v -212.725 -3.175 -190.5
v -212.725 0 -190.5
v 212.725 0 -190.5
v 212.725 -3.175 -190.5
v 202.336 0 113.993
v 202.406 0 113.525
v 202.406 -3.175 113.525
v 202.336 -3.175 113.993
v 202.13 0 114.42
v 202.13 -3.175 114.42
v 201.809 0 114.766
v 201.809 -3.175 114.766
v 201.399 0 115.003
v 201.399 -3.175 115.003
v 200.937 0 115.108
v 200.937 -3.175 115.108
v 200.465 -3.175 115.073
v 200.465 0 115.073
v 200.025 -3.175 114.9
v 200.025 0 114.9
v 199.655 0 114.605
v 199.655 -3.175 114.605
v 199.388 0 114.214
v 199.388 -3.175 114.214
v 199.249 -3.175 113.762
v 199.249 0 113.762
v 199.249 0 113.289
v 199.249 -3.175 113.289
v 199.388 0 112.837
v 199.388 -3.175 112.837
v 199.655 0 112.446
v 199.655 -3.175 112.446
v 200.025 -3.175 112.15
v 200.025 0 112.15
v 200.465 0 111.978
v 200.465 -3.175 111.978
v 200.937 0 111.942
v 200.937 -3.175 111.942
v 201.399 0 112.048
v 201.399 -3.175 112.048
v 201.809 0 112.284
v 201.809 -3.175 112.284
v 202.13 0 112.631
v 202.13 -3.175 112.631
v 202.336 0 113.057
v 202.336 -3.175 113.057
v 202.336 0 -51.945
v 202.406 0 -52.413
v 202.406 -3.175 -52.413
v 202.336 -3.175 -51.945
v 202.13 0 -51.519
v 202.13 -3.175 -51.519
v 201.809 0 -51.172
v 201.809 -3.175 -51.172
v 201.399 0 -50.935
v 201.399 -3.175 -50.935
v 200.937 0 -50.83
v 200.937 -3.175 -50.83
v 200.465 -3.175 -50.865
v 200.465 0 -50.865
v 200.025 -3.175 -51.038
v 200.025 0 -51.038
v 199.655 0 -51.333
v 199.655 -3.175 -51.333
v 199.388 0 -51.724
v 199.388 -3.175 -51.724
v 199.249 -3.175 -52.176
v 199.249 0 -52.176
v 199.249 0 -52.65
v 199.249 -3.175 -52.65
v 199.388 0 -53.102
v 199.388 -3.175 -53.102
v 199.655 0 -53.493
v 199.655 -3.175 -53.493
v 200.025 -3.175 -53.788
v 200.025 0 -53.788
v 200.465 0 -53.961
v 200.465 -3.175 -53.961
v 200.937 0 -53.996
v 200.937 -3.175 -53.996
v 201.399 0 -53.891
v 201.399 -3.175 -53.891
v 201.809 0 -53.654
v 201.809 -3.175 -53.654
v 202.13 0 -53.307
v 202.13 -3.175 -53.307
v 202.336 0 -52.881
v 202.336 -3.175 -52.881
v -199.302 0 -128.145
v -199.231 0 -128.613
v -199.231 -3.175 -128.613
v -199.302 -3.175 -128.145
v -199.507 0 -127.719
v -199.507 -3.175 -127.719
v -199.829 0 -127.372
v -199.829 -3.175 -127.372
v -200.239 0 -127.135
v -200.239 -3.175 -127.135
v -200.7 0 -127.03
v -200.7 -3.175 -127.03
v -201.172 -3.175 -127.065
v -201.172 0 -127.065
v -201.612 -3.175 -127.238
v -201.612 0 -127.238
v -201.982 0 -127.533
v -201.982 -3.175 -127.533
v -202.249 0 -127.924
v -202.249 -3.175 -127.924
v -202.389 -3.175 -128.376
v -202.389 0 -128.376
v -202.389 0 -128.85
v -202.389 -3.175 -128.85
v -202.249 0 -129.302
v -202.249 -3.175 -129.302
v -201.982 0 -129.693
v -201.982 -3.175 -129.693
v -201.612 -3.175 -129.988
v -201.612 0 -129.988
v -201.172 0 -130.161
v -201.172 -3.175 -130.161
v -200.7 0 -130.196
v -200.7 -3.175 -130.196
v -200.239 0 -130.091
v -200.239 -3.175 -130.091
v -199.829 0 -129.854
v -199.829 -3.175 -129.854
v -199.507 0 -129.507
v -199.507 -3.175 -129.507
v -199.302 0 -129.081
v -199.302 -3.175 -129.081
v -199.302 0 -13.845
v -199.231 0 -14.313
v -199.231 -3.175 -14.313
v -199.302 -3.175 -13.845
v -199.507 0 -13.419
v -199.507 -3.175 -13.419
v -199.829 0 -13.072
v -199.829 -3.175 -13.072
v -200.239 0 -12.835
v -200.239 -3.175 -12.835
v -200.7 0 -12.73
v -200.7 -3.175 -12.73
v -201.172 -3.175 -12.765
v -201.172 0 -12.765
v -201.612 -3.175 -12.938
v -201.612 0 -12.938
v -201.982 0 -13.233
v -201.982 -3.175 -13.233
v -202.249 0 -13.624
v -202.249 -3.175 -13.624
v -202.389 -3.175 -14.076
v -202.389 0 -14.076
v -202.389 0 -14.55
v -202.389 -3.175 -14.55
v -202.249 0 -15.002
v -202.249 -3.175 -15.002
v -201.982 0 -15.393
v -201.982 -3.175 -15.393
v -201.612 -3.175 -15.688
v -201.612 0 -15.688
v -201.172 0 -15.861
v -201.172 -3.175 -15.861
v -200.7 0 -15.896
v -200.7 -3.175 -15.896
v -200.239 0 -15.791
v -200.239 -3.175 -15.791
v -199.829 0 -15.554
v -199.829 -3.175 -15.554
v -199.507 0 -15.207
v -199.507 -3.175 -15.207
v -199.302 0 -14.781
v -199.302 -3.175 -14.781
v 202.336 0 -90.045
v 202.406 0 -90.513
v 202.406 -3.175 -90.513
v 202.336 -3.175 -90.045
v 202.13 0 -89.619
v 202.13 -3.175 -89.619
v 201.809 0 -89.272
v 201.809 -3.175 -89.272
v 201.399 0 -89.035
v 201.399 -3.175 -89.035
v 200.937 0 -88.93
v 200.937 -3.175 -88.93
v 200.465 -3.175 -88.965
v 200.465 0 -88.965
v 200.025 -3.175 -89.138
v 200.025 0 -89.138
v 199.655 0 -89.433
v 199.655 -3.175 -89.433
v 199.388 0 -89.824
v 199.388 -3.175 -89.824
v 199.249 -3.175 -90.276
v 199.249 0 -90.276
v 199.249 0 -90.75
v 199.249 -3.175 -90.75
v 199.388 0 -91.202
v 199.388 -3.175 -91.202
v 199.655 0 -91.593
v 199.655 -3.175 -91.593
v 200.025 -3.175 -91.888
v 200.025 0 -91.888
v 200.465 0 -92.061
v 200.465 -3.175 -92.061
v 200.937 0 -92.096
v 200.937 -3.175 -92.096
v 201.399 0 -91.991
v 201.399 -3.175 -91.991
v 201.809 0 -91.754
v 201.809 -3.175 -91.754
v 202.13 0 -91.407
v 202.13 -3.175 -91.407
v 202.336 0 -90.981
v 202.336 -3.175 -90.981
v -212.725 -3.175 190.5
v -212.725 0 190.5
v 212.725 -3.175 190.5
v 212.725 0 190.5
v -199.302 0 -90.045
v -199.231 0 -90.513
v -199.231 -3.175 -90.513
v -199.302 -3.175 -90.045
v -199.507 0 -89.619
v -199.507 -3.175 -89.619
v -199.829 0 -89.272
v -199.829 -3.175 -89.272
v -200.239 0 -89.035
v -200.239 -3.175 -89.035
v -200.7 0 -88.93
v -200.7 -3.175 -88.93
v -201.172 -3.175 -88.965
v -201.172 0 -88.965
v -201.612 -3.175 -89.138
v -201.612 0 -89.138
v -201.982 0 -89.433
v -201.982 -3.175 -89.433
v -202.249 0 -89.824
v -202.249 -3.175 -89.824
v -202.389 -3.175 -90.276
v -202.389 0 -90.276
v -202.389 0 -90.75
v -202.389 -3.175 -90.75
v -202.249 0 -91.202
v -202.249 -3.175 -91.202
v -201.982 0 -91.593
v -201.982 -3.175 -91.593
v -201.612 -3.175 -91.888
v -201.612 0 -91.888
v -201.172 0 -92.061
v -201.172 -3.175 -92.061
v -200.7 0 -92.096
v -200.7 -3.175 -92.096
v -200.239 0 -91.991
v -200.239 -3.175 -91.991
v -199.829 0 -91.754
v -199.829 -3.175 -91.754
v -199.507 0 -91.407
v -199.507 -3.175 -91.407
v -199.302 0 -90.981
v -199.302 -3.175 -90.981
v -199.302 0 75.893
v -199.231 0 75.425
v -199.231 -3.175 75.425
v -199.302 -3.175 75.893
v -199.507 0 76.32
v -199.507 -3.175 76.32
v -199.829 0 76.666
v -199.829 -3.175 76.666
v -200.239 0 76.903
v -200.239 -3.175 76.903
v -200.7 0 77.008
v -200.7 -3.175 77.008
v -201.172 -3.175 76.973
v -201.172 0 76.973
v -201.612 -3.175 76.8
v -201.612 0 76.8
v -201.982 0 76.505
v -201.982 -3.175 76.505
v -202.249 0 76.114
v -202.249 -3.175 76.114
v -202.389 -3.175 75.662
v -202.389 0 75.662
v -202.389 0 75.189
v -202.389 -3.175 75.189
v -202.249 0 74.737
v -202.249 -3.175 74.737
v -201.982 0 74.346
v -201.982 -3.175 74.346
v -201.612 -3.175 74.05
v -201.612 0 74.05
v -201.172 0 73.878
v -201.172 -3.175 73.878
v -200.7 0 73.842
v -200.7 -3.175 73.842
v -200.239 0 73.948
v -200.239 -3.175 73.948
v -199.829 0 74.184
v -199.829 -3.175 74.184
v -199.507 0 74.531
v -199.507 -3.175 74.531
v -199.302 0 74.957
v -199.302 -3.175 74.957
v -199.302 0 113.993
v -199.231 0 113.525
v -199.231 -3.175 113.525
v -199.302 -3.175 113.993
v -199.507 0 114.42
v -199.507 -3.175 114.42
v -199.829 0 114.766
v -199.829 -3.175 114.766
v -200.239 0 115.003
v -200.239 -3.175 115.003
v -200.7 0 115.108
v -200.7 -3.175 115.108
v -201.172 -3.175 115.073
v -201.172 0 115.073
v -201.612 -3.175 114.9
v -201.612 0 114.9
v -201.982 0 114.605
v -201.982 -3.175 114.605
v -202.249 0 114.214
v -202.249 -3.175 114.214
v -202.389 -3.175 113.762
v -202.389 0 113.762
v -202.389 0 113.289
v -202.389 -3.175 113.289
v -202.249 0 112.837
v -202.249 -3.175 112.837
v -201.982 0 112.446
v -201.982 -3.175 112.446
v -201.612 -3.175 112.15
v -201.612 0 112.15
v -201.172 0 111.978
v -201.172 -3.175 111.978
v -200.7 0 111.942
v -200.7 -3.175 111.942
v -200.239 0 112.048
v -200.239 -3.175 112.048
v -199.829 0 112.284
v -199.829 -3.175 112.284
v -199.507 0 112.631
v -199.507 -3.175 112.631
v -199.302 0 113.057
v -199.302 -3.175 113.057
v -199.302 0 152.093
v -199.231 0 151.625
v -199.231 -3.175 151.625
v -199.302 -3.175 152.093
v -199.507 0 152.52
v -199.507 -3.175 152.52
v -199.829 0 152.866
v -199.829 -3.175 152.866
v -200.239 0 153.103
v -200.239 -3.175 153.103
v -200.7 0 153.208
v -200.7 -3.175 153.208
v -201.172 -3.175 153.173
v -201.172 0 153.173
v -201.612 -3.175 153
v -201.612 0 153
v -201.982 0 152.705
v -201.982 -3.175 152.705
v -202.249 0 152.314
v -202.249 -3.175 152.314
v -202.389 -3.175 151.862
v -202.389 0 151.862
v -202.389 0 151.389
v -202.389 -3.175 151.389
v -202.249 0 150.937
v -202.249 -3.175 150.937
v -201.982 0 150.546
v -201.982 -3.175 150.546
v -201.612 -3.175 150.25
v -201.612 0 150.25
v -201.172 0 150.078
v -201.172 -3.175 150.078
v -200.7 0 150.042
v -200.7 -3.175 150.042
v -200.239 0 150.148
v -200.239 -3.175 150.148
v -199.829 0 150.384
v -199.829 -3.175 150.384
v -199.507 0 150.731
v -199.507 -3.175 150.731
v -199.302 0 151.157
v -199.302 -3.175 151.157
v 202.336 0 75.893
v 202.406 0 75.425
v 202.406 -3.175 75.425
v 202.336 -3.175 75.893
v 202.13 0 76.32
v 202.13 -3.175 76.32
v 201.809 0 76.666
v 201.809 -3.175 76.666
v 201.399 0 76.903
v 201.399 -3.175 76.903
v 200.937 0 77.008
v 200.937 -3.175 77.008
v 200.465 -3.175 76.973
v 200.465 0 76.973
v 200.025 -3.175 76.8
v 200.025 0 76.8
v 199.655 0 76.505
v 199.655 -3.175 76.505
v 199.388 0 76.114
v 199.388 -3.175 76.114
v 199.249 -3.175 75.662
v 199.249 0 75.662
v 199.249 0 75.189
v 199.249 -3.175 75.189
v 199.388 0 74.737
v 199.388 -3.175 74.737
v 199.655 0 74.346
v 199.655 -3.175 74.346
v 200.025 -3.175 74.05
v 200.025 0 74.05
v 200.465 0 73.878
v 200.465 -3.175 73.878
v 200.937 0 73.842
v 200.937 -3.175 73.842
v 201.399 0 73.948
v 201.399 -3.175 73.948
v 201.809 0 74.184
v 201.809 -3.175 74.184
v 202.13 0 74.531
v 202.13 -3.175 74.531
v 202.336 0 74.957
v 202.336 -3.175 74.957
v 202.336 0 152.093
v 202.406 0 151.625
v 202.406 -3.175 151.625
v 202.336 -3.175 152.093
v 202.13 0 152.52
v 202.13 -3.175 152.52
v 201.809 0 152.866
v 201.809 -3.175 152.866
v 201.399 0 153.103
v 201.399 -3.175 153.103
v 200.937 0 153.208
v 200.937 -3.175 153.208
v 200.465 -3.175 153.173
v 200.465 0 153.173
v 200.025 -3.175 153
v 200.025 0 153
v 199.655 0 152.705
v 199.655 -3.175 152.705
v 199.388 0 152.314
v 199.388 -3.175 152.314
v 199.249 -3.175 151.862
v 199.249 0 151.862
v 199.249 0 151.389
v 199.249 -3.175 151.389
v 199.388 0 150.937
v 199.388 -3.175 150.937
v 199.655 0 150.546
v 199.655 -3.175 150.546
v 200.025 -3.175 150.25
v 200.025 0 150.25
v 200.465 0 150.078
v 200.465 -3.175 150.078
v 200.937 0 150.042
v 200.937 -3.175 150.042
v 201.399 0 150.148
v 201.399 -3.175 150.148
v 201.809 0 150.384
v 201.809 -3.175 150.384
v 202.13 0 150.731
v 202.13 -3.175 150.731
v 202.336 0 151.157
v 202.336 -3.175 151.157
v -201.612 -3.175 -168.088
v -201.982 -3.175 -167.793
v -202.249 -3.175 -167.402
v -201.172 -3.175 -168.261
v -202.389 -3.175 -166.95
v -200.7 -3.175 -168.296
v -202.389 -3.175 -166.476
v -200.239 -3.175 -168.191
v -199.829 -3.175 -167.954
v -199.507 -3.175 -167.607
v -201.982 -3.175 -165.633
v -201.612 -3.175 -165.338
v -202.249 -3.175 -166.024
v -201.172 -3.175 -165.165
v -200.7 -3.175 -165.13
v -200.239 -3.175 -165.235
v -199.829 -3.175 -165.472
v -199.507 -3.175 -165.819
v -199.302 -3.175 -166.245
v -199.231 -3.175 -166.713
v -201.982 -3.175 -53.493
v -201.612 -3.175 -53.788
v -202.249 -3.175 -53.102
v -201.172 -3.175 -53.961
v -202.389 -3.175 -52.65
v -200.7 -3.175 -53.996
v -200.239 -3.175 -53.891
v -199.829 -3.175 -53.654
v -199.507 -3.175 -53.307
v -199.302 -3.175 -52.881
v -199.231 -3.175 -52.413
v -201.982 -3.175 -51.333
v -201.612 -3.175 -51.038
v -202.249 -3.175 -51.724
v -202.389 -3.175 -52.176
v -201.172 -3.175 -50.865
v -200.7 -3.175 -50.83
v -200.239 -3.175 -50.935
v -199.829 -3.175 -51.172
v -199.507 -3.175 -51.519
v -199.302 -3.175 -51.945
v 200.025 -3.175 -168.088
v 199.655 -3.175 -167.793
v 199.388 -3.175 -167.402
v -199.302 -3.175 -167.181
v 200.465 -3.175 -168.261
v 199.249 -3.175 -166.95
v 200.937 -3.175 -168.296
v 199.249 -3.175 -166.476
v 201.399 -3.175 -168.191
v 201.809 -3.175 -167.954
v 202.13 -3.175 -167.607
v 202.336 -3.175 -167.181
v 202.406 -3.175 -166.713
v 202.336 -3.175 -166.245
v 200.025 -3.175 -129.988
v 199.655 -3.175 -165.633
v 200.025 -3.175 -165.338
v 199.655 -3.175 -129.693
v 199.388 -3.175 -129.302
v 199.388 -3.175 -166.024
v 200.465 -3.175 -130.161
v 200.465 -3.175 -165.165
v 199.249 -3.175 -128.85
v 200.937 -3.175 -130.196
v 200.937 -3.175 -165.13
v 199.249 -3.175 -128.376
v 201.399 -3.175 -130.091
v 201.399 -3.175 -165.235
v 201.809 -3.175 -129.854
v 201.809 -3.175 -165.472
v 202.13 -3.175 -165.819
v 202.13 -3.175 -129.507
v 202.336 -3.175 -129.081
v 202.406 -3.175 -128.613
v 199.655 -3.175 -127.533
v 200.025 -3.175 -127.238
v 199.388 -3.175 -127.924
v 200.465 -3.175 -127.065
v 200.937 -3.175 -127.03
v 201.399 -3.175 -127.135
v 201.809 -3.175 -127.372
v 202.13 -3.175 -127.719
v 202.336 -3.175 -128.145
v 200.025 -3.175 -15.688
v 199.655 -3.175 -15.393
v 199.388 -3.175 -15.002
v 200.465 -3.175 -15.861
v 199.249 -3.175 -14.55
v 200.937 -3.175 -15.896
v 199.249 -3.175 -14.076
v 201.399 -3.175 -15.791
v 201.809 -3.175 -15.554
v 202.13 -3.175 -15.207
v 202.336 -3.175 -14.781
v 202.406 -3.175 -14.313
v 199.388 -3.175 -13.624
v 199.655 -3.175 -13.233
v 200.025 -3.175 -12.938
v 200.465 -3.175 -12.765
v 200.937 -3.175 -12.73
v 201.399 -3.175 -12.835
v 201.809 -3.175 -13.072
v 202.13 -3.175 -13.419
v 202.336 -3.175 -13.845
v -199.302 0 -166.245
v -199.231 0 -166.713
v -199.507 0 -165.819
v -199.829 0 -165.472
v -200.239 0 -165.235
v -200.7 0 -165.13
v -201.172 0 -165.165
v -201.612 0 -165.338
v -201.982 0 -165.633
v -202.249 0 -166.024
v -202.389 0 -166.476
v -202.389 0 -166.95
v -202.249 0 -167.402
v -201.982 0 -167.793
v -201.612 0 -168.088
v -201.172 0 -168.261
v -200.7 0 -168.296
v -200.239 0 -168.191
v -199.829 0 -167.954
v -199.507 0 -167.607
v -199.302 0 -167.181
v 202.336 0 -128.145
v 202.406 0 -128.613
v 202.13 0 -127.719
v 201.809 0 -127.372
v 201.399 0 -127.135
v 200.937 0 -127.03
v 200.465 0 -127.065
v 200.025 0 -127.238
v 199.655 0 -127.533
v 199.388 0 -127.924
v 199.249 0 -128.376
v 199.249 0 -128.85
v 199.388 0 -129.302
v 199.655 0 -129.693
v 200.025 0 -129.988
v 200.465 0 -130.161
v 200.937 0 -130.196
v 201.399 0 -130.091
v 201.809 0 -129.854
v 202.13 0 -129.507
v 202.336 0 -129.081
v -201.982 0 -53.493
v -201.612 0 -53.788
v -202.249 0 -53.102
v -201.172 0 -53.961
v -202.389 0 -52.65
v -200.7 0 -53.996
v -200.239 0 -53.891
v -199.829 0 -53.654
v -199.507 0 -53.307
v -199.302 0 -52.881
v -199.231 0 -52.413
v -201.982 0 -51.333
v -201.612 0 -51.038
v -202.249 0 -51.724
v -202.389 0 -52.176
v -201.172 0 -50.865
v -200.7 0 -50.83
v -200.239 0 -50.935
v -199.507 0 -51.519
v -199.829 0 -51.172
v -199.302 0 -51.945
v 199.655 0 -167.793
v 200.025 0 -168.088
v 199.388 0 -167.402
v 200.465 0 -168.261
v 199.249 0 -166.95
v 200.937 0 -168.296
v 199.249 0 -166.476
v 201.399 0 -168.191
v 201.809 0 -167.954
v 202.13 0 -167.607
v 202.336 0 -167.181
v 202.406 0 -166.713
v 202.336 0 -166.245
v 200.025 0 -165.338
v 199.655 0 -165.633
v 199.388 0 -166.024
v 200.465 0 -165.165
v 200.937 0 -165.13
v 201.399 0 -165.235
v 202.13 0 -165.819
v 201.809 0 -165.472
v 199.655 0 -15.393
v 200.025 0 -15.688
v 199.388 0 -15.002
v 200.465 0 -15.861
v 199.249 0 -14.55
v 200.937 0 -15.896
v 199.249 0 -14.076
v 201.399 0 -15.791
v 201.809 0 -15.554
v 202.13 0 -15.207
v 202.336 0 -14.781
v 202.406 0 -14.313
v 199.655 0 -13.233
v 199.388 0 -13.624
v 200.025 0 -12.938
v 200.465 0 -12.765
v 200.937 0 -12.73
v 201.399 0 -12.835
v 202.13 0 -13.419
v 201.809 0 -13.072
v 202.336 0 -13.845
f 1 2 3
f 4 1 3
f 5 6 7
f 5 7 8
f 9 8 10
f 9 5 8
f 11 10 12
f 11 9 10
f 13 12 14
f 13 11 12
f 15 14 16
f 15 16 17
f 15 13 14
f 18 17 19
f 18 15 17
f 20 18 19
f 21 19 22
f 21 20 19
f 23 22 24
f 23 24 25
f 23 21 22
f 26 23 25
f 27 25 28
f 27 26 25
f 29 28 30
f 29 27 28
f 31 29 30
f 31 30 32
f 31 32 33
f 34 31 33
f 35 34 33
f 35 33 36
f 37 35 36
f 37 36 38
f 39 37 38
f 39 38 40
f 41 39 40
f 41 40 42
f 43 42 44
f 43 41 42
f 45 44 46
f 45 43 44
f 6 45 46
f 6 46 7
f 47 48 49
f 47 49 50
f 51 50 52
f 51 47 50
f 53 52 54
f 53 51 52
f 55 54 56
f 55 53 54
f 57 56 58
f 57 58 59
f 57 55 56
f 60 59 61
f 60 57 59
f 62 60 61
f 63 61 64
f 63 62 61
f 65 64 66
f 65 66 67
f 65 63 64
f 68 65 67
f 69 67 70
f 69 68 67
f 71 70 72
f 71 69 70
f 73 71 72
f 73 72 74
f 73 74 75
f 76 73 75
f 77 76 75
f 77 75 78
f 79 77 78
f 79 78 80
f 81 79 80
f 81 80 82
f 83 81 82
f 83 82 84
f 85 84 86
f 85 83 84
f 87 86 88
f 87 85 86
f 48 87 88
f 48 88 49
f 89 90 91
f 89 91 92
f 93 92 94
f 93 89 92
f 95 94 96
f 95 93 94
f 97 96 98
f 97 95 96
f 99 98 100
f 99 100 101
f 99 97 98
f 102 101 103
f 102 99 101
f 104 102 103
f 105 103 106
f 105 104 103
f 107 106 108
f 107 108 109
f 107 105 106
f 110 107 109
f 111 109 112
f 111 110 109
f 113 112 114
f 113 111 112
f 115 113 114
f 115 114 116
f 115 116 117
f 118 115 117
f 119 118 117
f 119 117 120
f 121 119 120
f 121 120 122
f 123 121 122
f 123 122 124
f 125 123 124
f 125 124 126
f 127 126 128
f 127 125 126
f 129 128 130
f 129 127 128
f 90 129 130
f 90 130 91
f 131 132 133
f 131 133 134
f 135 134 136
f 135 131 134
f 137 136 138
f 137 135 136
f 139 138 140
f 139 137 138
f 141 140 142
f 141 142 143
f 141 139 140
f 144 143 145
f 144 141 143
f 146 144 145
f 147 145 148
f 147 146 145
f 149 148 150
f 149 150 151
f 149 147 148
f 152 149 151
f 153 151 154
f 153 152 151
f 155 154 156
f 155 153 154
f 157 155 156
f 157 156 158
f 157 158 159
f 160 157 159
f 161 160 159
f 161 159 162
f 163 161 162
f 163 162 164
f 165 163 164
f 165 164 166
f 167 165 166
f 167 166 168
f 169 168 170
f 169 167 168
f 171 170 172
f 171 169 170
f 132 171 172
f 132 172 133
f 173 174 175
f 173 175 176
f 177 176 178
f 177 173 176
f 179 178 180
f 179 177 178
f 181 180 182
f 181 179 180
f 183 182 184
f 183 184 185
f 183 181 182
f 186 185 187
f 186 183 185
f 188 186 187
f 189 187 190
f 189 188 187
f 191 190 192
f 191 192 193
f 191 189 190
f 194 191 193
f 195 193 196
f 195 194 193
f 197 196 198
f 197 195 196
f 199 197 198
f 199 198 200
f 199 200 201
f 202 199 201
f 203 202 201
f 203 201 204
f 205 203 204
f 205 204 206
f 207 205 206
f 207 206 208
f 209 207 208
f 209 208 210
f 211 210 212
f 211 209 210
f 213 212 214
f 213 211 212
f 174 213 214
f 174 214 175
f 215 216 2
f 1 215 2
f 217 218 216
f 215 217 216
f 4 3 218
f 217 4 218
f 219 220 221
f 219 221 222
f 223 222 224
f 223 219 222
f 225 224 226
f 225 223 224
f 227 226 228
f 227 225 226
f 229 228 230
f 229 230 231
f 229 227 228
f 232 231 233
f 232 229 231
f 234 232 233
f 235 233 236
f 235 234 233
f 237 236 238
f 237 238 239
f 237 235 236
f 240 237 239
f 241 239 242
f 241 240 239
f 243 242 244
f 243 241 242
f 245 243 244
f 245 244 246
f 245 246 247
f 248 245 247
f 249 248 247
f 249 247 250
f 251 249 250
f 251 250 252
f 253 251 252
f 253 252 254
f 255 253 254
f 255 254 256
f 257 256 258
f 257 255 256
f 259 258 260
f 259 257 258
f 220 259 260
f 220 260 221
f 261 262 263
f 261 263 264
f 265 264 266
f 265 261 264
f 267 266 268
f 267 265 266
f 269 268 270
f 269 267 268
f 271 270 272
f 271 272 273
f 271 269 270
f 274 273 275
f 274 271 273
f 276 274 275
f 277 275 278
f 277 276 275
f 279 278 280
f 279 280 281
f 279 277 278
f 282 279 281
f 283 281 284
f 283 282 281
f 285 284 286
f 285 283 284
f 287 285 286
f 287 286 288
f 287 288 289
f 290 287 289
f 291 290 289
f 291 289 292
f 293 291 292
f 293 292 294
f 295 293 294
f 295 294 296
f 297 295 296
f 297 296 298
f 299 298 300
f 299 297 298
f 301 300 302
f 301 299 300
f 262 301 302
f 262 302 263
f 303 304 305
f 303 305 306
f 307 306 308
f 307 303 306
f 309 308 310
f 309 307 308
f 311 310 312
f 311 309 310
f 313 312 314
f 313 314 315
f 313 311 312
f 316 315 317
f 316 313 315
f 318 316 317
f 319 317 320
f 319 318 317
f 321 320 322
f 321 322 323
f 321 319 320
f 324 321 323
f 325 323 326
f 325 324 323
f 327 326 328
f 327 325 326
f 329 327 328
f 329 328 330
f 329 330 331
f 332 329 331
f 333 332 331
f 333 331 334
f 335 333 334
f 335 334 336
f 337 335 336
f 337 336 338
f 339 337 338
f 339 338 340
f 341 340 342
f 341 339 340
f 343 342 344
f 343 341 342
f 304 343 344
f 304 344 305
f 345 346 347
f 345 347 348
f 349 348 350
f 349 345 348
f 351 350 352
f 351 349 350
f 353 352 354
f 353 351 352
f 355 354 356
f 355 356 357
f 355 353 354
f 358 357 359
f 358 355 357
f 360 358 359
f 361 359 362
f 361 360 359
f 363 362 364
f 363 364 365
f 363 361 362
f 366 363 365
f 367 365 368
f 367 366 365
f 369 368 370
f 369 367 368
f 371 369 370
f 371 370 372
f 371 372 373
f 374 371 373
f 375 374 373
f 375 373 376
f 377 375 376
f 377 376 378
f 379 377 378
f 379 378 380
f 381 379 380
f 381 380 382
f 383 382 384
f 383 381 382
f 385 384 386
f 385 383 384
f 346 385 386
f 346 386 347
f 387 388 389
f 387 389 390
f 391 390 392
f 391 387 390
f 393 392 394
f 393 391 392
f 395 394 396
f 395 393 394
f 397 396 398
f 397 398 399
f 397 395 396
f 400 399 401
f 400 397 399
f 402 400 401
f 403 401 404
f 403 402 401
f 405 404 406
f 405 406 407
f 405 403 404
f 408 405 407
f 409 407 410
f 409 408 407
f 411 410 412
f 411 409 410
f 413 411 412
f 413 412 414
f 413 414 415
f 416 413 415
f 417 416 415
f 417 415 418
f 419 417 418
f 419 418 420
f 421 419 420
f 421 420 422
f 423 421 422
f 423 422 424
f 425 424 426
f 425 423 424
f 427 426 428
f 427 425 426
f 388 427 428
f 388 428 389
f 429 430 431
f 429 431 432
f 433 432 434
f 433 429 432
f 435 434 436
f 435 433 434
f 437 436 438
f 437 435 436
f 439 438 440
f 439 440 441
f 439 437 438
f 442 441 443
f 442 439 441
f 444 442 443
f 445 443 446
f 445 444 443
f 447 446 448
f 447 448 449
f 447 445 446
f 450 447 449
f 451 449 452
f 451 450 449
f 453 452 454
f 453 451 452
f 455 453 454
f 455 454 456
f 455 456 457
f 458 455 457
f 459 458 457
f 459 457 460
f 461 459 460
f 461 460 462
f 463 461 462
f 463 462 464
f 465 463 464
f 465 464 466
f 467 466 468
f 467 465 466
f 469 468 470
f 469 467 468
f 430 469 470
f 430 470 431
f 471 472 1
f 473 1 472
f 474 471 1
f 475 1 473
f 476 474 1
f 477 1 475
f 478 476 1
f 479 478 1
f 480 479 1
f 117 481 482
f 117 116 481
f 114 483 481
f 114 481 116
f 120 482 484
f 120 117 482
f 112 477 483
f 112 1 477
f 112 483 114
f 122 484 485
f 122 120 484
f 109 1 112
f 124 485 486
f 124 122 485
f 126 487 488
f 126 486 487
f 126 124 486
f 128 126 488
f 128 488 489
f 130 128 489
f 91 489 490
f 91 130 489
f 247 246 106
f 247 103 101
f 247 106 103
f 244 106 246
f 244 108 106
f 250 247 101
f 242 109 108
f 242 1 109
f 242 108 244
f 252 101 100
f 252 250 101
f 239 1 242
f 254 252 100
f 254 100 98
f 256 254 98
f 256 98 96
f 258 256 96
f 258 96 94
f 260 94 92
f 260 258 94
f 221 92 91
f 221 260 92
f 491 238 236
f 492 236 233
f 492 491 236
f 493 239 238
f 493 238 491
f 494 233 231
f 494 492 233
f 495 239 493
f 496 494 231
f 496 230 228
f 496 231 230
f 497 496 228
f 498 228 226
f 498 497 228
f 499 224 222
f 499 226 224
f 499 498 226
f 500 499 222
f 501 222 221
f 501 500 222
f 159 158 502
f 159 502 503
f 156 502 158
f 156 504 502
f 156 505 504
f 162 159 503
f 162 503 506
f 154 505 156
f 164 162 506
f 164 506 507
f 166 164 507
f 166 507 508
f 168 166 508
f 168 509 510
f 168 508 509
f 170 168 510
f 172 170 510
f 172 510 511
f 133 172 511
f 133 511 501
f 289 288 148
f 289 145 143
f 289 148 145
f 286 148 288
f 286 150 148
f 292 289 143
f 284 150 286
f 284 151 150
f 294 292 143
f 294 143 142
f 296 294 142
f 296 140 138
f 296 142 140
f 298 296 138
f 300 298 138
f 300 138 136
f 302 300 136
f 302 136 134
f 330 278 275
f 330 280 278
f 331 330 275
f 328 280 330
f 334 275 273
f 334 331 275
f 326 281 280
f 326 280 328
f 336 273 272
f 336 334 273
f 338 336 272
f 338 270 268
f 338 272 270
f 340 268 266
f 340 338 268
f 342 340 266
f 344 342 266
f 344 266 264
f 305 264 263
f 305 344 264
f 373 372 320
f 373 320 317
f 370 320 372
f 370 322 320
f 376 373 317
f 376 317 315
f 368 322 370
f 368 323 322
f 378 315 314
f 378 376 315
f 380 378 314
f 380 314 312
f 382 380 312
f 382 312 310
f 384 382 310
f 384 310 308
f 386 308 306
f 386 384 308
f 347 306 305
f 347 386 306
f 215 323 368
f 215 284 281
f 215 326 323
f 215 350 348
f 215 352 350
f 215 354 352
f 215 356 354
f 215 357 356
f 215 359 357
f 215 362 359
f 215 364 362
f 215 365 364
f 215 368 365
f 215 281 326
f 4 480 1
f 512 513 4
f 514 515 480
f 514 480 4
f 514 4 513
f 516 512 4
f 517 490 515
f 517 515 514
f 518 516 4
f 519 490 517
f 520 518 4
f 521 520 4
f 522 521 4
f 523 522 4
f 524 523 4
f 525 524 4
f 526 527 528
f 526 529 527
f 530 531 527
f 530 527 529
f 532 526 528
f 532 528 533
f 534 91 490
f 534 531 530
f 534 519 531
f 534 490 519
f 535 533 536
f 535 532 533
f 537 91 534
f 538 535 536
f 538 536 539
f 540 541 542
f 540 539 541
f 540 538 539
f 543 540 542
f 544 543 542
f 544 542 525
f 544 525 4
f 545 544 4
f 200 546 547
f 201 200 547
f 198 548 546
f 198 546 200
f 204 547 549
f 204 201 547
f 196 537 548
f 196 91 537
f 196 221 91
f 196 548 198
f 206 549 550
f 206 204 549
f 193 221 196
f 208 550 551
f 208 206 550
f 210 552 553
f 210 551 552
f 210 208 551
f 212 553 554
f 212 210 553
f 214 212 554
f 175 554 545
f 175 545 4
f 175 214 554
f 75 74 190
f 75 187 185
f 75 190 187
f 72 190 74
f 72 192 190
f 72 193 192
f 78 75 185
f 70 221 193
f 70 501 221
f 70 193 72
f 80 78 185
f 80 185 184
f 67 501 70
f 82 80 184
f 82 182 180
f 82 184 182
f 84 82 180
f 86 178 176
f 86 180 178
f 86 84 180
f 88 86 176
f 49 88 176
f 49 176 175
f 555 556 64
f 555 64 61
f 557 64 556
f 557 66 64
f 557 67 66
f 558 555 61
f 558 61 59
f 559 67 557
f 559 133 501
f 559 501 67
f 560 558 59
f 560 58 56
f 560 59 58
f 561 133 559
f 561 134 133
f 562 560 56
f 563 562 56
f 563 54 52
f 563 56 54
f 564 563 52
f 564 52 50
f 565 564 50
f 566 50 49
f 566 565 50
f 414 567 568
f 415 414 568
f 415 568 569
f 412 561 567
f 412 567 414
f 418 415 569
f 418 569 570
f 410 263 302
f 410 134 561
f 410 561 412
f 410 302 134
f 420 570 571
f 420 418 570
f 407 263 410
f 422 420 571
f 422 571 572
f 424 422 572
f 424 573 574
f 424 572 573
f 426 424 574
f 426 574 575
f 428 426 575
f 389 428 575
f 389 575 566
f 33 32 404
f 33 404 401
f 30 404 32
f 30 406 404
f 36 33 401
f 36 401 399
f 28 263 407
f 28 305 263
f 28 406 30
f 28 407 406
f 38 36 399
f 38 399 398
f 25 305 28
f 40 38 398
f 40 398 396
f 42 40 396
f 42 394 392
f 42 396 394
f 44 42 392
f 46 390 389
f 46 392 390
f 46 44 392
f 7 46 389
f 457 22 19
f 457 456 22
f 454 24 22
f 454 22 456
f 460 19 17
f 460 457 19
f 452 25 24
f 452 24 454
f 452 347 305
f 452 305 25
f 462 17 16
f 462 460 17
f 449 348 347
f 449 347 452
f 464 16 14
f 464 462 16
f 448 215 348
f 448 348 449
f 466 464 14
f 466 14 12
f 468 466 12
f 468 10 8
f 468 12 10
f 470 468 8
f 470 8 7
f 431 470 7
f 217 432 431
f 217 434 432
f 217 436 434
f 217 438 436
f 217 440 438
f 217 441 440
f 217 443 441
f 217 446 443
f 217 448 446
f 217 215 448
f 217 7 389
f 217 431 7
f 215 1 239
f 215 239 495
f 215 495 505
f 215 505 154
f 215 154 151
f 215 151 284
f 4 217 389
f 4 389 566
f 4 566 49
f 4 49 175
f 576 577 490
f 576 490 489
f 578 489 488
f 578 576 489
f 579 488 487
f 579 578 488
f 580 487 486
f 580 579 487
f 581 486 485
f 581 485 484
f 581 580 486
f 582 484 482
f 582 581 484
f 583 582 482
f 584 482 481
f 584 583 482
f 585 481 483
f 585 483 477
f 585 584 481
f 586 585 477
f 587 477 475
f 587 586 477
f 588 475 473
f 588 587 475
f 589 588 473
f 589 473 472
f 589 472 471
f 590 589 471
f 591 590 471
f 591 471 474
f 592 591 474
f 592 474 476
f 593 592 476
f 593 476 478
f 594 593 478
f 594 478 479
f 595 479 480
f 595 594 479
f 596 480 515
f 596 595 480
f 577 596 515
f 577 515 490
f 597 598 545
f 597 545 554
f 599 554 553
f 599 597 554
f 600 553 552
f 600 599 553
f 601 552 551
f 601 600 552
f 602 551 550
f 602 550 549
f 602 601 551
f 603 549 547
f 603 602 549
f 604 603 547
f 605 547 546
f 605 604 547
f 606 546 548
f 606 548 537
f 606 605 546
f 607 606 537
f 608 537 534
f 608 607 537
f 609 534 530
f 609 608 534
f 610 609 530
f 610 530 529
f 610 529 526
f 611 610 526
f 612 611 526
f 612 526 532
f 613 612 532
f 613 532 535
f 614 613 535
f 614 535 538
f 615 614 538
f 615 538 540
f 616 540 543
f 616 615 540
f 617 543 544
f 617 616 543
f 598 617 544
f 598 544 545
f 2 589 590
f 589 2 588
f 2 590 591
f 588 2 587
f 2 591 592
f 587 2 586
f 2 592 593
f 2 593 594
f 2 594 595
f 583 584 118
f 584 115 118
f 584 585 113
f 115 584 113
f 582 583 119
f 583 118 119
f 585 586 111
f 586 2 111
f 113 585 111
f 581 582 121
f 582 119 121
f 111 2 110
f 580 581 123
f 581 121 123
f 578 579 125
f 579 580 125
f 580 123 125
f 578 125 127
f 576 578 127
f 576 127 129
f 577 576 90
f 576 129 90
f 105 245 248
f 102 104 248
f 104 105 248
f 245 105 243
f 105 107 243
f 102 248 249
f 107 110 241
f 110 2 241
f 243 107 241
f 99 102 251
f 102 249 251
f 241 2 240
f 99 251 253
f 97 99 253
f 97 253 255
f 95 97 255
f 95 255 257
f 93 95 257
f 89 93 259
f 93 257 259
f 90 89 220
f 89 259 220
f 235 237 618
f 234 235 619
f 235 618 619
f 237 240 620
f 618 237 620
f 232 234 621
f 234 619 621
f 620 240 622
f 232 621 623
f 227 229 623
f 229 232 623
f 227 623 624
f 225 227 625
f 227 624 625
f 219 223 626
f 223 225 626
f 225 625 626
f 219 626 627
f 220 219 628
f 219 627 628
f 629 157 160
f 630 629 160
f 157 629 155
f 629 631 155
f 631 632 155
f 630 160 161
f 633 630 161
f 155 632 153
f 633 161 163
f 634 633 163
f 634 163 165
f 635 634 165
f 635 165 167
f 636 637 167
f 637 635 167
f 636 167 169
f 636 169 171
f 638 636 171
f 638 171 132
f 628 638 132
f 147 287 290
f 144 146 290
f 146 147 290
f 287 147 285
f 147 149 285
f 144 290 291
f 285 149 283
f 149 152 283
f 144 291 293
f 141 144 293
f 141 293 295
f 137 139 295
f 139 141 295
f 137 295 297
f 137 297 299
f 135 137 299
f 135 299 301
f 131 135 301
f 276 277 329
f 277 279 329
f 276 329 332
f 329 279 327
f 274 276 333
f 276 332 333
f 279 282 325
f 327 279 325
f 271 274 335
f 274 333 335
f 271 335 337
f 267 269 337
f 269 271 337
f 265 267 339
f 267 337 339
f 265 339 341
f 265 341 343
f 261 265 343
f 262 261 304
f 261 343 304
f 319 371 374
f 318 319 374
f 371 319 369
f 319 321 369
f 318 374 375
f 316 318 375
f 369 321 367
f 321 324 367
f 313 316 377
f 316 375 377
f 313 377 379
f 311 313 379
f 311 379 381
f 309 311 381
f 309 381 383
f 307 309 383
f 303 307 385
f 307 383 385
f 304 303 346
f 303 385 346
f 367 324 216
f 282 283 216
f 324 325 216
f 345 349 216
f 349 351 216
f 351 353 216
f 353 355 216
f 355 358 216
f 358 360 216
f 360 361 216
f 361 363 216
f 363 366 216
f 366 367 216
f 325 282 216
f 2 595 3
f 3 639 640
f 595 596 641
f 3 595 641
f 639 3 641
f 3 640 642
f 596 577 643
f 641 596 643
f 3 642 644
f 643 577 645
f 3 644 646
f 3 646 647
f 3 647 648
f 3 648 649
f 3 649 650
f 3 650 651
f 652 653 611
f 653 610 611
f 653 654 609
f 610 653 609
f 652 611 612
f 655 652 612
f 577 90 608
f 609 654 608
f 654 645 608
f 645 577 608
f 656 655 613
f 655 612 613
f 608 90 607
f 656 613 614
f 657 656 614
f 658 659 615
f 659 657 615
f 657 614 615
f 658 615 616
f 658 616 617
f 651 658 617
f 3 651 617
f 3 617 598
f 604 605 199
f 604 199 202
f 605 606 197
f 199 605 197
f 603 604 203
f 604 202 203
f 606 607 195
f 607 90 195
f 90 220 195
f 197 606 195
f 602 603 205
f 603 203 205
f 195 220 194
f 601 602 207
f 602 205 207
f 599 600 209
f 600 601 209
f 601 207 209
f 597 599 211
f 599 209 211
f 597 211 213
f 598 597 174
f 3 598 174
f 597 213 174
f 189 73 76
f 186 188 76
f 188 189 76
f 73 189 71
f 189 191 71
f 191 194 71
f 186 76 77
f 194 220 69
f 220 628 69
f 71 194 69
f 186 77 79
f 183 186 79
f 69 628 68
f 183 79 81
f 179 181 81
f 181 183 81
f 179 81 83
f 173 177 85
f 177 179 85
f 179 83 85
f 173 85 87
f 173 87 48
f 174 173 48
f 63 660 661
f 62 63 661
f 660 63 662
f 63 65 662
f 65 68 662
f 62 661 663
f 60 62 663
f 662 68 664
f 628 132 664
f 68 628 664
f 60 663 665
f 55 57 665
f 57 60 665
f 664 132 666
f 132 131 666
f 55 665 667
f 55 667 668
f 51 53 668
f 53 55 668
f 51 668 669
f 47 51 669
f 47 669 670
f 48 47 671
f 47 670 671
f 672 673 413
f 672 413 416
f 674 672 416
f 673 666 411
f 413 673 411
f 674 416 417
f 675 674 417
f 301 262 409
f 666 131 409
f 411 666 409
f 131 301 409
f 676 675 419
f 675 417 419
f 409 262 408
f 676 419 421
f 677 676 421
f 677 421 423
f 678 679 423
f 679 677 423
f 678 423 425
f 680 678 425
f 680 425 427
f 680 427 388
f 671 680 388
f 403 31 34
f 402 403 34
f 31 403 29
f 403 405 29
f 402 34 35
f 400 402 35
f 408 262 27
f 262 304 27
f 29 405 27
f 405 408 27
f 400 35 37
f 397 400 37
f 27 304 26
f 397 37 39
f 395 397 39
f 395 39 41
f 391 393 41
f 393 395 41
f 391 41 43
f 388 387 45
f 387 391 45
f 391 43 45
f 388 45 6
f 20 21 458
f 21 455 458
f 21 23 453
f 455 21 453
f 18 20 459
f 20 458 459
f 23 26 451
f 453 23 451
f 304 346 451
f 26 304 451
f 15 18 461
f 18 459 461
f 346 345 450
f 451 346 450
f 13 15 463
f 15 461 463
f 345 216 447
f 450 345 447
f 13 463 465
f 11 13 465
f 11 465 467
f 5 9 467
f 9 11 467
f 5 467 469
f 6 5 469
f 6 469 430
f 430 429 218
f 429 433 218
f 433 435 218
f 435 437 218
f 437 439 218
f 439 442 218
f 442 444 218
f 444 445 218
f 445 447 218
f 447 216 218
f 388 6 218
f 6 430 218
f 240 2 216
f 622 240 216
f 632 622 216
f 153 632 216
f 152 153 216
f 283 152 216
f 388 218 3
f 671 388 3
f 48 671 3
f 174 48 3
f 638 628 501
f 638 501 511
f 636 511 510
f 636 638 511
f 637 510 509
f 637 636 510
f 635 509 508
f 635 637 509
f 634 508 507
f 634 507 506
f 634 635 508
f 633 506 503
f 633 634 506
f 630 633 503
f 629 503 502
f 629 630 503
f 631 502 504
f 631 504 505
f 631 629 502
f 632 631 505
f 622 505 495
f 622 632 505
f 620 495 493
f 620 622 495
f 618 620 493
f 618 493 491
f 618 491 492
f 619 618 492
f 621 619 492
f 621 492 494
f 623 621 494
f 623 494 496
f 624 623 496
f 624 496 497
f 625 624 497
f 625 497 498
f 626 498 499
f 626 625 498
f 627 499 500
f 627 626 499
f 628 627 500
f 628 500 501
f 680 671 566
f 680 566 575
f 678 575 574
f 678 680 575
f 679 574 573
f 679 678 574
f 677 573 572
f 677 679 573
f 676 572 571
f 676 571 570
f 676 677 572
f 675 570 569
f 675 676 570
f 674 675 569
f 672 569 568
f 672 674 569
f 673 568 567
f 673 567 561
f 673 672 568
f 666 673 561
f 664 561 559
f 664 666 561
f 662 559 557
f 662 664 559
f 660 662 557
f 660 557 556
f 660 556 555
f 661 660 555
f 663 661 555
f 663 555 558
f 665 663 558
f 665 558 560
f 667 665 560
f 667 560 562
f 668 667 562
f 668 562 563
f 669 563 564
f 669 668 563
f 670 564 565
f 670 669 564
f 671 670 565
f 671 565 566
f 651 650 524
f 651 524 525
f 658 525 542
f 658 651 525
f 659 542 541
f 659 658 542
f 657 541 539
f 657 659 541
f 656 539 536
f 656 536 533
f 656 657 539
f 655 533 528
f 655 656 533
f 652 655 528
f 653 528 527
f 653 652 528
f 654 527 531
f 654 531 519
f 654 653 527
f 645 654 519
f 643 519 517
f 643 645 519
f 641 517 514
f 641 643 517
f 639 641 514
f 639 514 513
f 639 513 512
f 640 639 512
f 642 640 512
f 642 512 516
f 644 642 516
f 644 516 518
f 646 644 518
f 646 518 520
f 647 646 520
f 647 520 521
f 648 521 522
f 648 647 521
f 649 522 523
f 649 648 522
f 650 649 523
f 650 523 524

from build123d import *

# Parameters (mm, degrees)
F0_R     = 1.5875
F0_W     = 23.8125
F0_H     = 127
F0_H_2   = 199.9742
F1_DEPTH = 3.175


with BuildPart() as f1:
    # F0 (on Front) → F1 (new body)
    with BuildSketch(Plane.XZ):
        Polygon((212.725, 190.5), (-212.725, 190.5), (-212.725, 177.0253), (-188.9125, 177.0253), (-188.9125, 50.0253), (-212.725, 50.0253), (-212.725, 9.4742), (-188.9125, 9.4742), (-188.9125, -190.5), (188.9125, -190.5), (188.9125, 9.4742), (212.725, 9.4742), align=None)
        with Locations((200.81875, 75.4253)):
            Circle(F0_R, mode=Mode.SUBTRACT)
        with Locations((200.81875, 113.5253)):
            Circle(F0_R, mode=Mode.SUBTRACT)
        with Locations((200.81875, 151.6253)):
            Circle(F0_R, mode=Mode.SUBTRACT)
        with Locations((-200.81875, 113.5253)):
            Rectangle(F0_W, F0_H)
        with Locations((-200.81875, 75.4253)):
            Circle(F0_R, mode=Mode.SUBTRACT)
        with Locations((-200.81875, 113.5253)):
            Circle(F0_R, mode=Mode.SUBTRACT)
        with Locations((-200.81875, 151.6253)):
            Circle(F0_R, mode=Mode.SUBTRACT)
        with Locations((-200.81875, -90.5129)):
            Rectangle(F0_W, F0_H_2)
        with Locations((-200.81875, -166.7129)):
            Circle(F0_R, mode=Mode.SUBTRACT)
        with Locations((-200.81875, -128.6129)):
            Circle(F0_R, mode=Mode.SUBTRACT)
        with Locations((-200.81875, -90.5129)):
            Circle(F0_R, mode=Mode.SUBTRACT)
        with Locations((-200.81875, -52.4129)):
            Circle(F0_R, mode=Mode.SUBTRACT)
        with Locations((-200.81875, -14.3129)):
            Circle(F0_R, mode=Mode.SUBTRACT)
        with Locations((200.81875, -90.5129)):
            Rectangle(F0_W, F0_H_2)
        with Locations((200.81875, -166.7129)):
            Circle(F0_R, mode=Mode.SUBTRACT)
        with Locations((200.81875, -128.6129)):
            Circle(F0_R, mode=Mode.SUBTRACT)
        with Locations((200.81875, -90.5129)):
            Circle(F0_R, mode=Mode.SUBTRACT)
        with Locations((200.81875, -52.4129)):
            Circle(F0_R, mode=Mode.SUBTRACT)
        with Locations((200.81875, -14.3129)):
            Circle(F0_R, mode=Mode.SUBTRACT)
    extrude(amount=F1_DEPTH)


solid = f1.part
